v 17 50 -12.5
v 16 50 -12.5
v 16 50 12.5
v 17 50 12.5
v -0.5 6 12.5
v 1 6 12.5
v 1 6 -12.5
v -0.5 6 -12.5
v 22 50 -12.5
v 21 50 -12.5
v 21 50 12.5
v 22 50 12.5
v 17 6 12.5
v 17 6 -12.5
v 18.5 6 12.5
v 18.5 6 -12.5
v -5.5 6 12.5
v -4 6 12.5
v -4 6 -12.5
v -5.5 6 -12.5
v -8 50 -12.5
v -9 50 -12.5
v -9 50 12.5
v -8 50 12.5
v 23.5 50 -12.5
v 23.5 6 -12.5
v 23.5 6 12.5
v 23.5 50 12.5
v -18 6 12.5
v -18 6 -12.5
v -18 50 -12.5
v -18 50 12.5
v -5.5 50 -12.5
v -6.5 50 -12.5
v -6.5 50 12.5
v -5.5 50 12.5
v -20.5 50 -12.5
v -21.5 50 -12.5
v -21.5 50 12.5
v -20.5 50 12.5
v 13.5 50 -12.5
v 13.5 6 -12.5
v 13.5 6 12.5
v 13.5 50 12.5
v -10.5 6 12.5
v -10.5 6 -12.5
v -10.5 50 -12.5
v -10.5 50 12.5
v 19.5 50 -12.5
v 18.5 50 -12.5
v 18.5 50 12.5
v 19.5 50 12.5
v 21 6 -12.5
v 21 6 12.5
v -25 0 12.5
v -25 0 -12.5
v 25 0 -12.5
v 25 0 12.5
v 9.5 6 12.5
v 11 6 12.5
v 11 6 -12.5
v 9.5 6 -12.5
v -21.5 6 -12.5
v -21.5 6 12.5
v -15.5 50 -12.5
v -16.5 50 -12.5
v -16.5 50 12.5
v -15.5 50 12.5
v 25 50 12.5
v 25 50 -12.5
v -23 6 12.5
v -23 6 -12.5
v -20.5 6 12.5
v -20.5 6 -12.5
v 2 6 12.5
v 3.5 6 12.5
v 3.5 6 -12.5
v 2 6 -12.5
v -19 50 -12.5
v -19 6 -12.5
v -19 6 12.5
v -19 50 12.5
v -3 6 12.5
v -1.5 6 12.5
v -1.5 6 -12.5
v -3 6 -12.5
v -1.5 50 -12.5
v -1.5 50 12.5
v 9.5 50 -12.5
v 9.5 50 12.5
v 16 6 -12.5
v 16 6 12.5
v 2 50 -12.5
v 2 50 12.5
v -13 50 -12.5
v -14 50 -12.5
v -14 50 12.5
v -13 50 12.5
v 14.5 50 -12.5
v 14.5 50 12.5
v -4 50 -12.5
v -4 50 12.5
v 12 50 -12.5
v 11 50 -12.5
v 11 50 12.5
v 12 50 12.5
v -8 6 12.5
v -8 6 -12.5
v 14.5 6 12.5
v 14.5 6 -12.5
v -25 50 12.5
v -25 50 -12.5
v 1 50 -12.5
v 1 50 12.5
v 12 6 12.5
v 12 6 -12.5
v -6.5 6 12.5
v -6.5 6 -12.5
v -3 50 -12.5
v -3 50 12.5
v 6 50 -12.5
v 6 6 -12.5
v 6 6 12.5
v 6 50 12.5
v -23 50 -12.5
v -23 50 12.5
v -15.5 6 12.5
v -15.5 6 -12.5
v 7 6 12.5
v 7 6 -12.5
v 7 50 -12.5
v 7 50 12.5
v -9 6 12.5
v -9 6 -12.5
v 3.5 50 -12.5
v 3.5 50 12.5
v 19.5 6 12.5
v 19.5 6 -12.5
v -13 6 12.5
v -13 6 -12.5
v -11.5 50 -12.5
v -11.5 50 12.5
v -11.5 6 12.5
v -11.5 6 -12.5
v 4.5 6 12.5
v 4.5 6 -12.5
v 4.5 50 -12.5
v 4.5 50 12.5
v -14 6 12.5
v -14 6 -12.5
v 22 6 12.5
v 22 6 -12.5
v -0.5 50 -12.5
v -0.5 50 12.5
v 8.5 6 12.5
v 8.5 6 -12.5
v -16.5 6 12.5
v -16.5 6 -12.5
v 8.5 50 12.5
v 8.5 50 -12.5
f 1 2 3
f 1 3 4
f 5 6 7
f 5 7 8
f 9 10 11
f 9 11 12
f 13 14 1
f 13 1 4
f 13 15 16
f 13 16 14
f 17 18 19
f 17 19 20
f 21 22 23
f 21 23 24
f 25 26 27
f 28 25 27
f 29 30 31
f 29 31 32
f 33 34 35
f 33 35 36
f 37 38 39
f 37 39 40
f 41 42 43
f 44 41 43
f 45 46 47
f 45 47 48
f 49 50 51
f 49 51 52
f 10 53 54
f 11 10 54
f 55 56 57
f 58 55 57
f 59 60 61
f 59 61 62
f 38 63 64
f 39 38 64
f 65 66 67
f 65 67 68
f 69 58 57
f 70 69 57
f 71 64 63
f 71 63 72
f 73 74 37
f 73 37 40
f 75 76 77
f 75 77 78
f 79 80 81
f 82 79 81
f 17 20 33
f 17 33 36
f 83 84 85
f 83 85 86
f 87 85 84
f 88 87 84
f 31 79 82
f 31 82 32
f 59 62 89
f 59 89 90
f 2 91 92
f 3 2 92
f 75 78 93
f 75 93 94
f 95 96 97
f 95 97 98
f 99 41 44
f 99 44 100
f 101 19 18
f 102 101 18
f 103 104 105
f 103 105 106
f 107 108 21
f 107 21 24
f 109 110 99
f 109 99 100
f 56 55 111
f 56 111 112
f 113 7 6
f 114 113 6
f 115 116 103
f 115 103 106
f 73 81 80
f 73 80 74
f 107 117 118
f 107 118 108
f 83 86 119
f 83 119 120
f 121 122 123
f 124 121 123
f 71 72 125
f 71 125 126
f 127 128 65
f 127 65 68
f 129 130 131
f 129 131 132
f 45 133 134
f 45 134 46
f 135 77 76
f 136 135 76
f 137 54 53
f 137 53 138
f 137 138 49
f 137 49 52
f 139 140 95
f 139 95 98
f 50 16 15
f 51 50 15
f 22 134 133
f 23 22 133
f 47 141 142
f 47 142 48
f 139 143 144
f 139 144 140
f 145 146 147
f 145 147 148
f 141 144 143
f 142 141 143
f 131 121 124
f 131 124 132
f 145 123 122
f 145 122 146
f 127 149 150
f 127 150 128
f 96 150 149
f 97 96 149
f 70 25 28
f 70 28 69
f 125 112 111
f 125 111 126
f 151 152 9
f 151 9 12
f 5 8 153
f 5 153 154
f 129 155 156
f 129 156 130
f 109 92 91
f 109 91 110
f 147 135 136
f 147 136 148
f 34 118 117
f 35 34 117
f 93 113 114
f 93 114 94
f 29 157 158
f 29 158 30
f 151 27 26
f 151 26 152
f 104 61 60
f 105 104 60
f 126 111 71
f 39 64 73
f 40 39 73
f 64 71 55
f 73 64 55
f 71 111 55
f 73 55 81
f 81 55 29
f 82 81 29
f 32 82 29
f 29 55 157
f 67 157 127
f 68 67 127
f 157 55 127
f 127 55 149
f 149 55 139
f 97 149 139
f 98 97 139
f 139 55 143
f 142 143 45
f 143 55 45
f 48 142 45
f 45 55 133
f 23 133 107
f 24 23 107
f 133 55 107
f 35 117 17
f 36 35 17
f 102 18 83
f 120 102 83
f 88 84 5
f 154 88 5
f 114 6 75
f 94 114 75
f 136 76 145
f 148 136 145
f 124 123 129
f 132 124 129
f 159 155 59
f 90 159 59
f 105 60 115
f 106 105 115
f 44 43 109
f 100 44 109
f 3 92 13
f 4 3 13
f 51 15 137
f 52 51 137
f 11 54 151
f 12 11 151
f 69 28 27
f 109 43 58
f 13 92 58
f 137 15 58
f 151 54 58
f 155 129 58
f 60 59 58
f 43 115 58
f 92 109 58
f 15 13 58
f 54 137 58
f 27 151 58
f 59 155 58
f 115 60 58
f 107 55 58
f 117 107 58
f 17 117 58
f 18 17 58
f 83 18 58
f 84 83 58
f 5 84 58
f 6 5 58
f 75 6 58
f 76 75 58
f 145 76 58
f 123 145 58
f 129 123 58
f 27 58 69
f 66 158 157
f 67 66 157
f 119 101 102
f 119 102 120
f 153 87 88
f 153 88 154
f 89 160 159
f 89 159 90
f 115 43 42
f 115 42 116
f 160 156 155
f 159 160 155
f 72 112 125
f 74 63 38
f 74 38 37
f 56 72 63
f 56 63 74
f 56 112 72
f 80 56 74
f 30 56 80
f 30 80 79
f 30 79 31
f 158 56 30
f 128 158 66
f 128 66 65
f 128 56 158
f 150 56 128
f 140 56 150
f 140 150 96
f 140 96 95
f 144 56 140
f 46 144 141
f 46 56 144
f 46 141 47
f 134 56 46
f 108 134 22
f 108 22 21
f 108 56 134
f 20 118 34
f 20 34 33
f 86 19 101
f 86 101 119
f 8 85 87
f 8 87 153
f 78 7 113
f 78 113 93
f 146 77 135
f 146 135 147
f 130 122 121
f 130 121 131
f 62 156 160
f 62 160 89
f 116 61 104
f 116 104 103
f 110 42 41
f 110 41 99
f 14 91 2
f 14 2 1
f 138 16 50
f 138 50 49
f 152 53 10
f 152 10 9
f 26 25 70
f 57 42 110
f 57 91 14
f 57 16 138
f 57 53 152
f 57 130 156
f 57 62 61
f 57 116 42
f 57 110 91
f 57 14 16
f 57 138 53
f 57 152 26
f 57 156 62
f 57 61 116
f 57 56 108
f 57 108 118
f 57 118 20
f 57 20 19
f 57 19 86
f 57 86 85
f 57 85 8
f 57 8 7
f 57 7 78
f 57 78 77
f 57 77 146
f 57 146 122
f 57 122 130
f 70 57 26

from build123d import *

# Parameters (mm, degrees)
SKETCH_1_W          = 50
SKETCH_1_H          = 25
EXTRUDE_1_DEPTH     = 50
SKETCH_2_W          = 1.5
SKETCH_2_H          = 25
CUT_EXTRUDE_1_DEPTH = 44


with BuildPart() as part:
    # 草图1 → 拉伸1 (new body)
    with BuildSketch(Plane(origin=(0, 0, 0), x_dir=(1, 0, 0), z_dir=(0, 1, 0))):
        Rectangle(SKETCH_1_W, SKETCH_1_H)
    extrude(amount=EXTRUDE_1_DEPTH)

    # 草图2 → 切除-拉伸1 (cut)
    with BuildSketch(Plane(origin=(0, 50, 0), x_dir=(-1, 0, 0), z_dir=(0, 1, 0))):
        with Locations((-0.25, 0)):
            Rectangle(SKETCH_2_W, SKETCH_2_H)
        with Locations((2.25, 0)):
            Rectangle(SKETCH_2_W, SKETCH_2_H)
        with Locations((4.75, 0)):
            Rectangle(SKETCH_2_W, SKETCH_2_H)
        with Locations((7.25, 0)):
            Rectangle(SKETCH_2_W, SKETCH_2_H)
        with Locations((9.75, 0)):
            Rectangle(SKETCH_2_W, SKETCH_2_H)
        with Locations((12.25, 0)):
            Rectangle(SKETCH_2_W, SKETCH_2_H)
        with Locations((14.75, 0)):
            Rectangle(SKETCH_2_W, SKETCH_2_H)
        with Locations((17.25, 0)):
            Rectangle(SKETCH_2_W, SKETCH_2_H)
        with Locations((19.75, 0)):
            Rectangle(SKETCH_2_W, SKETCH_2_H)
        with Locations((22.25, 0)):
            Rectangle(SKETCH_2_W, SKETCH_2_H)
        with Locations((-2.75, 0)):
            Rectangle(SKETCH_2_W, SKETCH_2_H)
        with Locations((-5.25, 0)):
            Rectangle(SKETCH_2_W, SKETCH_2_H)
        with Locations((-7.75, 0)):
            Rectangle(SKETCH_2_W, SKETCH_2_H)
        with Locations((-10.25, 0)):
            Rectangle(SKETCH_2_W, SKETCH_2_H)
        with Locations((-12.75, 0)):
            Rectangle(SKETCH_2_W, SKETCH_2_H)
        with Locations((-15.25, 0)):
            Rectangle(SKETCH_2_W, SKETCH_2_H)
        with Locations((-17.75, 0)):
            Rectangle(SKETCH_2_W, SKETCH_2_H)
        with Locations((-20.25, 0)):
            Rectangle(SKETCH_2_W, SKETCH_2_H)
        with Locations((-22.75, 0)):
            Rectangle(SKETCH_2_W, SKETCH_2_H)
    extrude(amount=-CUT_EXTRUDE_1_DEPTH, mode=Mode.SUBTRACT)


solid = part.part
